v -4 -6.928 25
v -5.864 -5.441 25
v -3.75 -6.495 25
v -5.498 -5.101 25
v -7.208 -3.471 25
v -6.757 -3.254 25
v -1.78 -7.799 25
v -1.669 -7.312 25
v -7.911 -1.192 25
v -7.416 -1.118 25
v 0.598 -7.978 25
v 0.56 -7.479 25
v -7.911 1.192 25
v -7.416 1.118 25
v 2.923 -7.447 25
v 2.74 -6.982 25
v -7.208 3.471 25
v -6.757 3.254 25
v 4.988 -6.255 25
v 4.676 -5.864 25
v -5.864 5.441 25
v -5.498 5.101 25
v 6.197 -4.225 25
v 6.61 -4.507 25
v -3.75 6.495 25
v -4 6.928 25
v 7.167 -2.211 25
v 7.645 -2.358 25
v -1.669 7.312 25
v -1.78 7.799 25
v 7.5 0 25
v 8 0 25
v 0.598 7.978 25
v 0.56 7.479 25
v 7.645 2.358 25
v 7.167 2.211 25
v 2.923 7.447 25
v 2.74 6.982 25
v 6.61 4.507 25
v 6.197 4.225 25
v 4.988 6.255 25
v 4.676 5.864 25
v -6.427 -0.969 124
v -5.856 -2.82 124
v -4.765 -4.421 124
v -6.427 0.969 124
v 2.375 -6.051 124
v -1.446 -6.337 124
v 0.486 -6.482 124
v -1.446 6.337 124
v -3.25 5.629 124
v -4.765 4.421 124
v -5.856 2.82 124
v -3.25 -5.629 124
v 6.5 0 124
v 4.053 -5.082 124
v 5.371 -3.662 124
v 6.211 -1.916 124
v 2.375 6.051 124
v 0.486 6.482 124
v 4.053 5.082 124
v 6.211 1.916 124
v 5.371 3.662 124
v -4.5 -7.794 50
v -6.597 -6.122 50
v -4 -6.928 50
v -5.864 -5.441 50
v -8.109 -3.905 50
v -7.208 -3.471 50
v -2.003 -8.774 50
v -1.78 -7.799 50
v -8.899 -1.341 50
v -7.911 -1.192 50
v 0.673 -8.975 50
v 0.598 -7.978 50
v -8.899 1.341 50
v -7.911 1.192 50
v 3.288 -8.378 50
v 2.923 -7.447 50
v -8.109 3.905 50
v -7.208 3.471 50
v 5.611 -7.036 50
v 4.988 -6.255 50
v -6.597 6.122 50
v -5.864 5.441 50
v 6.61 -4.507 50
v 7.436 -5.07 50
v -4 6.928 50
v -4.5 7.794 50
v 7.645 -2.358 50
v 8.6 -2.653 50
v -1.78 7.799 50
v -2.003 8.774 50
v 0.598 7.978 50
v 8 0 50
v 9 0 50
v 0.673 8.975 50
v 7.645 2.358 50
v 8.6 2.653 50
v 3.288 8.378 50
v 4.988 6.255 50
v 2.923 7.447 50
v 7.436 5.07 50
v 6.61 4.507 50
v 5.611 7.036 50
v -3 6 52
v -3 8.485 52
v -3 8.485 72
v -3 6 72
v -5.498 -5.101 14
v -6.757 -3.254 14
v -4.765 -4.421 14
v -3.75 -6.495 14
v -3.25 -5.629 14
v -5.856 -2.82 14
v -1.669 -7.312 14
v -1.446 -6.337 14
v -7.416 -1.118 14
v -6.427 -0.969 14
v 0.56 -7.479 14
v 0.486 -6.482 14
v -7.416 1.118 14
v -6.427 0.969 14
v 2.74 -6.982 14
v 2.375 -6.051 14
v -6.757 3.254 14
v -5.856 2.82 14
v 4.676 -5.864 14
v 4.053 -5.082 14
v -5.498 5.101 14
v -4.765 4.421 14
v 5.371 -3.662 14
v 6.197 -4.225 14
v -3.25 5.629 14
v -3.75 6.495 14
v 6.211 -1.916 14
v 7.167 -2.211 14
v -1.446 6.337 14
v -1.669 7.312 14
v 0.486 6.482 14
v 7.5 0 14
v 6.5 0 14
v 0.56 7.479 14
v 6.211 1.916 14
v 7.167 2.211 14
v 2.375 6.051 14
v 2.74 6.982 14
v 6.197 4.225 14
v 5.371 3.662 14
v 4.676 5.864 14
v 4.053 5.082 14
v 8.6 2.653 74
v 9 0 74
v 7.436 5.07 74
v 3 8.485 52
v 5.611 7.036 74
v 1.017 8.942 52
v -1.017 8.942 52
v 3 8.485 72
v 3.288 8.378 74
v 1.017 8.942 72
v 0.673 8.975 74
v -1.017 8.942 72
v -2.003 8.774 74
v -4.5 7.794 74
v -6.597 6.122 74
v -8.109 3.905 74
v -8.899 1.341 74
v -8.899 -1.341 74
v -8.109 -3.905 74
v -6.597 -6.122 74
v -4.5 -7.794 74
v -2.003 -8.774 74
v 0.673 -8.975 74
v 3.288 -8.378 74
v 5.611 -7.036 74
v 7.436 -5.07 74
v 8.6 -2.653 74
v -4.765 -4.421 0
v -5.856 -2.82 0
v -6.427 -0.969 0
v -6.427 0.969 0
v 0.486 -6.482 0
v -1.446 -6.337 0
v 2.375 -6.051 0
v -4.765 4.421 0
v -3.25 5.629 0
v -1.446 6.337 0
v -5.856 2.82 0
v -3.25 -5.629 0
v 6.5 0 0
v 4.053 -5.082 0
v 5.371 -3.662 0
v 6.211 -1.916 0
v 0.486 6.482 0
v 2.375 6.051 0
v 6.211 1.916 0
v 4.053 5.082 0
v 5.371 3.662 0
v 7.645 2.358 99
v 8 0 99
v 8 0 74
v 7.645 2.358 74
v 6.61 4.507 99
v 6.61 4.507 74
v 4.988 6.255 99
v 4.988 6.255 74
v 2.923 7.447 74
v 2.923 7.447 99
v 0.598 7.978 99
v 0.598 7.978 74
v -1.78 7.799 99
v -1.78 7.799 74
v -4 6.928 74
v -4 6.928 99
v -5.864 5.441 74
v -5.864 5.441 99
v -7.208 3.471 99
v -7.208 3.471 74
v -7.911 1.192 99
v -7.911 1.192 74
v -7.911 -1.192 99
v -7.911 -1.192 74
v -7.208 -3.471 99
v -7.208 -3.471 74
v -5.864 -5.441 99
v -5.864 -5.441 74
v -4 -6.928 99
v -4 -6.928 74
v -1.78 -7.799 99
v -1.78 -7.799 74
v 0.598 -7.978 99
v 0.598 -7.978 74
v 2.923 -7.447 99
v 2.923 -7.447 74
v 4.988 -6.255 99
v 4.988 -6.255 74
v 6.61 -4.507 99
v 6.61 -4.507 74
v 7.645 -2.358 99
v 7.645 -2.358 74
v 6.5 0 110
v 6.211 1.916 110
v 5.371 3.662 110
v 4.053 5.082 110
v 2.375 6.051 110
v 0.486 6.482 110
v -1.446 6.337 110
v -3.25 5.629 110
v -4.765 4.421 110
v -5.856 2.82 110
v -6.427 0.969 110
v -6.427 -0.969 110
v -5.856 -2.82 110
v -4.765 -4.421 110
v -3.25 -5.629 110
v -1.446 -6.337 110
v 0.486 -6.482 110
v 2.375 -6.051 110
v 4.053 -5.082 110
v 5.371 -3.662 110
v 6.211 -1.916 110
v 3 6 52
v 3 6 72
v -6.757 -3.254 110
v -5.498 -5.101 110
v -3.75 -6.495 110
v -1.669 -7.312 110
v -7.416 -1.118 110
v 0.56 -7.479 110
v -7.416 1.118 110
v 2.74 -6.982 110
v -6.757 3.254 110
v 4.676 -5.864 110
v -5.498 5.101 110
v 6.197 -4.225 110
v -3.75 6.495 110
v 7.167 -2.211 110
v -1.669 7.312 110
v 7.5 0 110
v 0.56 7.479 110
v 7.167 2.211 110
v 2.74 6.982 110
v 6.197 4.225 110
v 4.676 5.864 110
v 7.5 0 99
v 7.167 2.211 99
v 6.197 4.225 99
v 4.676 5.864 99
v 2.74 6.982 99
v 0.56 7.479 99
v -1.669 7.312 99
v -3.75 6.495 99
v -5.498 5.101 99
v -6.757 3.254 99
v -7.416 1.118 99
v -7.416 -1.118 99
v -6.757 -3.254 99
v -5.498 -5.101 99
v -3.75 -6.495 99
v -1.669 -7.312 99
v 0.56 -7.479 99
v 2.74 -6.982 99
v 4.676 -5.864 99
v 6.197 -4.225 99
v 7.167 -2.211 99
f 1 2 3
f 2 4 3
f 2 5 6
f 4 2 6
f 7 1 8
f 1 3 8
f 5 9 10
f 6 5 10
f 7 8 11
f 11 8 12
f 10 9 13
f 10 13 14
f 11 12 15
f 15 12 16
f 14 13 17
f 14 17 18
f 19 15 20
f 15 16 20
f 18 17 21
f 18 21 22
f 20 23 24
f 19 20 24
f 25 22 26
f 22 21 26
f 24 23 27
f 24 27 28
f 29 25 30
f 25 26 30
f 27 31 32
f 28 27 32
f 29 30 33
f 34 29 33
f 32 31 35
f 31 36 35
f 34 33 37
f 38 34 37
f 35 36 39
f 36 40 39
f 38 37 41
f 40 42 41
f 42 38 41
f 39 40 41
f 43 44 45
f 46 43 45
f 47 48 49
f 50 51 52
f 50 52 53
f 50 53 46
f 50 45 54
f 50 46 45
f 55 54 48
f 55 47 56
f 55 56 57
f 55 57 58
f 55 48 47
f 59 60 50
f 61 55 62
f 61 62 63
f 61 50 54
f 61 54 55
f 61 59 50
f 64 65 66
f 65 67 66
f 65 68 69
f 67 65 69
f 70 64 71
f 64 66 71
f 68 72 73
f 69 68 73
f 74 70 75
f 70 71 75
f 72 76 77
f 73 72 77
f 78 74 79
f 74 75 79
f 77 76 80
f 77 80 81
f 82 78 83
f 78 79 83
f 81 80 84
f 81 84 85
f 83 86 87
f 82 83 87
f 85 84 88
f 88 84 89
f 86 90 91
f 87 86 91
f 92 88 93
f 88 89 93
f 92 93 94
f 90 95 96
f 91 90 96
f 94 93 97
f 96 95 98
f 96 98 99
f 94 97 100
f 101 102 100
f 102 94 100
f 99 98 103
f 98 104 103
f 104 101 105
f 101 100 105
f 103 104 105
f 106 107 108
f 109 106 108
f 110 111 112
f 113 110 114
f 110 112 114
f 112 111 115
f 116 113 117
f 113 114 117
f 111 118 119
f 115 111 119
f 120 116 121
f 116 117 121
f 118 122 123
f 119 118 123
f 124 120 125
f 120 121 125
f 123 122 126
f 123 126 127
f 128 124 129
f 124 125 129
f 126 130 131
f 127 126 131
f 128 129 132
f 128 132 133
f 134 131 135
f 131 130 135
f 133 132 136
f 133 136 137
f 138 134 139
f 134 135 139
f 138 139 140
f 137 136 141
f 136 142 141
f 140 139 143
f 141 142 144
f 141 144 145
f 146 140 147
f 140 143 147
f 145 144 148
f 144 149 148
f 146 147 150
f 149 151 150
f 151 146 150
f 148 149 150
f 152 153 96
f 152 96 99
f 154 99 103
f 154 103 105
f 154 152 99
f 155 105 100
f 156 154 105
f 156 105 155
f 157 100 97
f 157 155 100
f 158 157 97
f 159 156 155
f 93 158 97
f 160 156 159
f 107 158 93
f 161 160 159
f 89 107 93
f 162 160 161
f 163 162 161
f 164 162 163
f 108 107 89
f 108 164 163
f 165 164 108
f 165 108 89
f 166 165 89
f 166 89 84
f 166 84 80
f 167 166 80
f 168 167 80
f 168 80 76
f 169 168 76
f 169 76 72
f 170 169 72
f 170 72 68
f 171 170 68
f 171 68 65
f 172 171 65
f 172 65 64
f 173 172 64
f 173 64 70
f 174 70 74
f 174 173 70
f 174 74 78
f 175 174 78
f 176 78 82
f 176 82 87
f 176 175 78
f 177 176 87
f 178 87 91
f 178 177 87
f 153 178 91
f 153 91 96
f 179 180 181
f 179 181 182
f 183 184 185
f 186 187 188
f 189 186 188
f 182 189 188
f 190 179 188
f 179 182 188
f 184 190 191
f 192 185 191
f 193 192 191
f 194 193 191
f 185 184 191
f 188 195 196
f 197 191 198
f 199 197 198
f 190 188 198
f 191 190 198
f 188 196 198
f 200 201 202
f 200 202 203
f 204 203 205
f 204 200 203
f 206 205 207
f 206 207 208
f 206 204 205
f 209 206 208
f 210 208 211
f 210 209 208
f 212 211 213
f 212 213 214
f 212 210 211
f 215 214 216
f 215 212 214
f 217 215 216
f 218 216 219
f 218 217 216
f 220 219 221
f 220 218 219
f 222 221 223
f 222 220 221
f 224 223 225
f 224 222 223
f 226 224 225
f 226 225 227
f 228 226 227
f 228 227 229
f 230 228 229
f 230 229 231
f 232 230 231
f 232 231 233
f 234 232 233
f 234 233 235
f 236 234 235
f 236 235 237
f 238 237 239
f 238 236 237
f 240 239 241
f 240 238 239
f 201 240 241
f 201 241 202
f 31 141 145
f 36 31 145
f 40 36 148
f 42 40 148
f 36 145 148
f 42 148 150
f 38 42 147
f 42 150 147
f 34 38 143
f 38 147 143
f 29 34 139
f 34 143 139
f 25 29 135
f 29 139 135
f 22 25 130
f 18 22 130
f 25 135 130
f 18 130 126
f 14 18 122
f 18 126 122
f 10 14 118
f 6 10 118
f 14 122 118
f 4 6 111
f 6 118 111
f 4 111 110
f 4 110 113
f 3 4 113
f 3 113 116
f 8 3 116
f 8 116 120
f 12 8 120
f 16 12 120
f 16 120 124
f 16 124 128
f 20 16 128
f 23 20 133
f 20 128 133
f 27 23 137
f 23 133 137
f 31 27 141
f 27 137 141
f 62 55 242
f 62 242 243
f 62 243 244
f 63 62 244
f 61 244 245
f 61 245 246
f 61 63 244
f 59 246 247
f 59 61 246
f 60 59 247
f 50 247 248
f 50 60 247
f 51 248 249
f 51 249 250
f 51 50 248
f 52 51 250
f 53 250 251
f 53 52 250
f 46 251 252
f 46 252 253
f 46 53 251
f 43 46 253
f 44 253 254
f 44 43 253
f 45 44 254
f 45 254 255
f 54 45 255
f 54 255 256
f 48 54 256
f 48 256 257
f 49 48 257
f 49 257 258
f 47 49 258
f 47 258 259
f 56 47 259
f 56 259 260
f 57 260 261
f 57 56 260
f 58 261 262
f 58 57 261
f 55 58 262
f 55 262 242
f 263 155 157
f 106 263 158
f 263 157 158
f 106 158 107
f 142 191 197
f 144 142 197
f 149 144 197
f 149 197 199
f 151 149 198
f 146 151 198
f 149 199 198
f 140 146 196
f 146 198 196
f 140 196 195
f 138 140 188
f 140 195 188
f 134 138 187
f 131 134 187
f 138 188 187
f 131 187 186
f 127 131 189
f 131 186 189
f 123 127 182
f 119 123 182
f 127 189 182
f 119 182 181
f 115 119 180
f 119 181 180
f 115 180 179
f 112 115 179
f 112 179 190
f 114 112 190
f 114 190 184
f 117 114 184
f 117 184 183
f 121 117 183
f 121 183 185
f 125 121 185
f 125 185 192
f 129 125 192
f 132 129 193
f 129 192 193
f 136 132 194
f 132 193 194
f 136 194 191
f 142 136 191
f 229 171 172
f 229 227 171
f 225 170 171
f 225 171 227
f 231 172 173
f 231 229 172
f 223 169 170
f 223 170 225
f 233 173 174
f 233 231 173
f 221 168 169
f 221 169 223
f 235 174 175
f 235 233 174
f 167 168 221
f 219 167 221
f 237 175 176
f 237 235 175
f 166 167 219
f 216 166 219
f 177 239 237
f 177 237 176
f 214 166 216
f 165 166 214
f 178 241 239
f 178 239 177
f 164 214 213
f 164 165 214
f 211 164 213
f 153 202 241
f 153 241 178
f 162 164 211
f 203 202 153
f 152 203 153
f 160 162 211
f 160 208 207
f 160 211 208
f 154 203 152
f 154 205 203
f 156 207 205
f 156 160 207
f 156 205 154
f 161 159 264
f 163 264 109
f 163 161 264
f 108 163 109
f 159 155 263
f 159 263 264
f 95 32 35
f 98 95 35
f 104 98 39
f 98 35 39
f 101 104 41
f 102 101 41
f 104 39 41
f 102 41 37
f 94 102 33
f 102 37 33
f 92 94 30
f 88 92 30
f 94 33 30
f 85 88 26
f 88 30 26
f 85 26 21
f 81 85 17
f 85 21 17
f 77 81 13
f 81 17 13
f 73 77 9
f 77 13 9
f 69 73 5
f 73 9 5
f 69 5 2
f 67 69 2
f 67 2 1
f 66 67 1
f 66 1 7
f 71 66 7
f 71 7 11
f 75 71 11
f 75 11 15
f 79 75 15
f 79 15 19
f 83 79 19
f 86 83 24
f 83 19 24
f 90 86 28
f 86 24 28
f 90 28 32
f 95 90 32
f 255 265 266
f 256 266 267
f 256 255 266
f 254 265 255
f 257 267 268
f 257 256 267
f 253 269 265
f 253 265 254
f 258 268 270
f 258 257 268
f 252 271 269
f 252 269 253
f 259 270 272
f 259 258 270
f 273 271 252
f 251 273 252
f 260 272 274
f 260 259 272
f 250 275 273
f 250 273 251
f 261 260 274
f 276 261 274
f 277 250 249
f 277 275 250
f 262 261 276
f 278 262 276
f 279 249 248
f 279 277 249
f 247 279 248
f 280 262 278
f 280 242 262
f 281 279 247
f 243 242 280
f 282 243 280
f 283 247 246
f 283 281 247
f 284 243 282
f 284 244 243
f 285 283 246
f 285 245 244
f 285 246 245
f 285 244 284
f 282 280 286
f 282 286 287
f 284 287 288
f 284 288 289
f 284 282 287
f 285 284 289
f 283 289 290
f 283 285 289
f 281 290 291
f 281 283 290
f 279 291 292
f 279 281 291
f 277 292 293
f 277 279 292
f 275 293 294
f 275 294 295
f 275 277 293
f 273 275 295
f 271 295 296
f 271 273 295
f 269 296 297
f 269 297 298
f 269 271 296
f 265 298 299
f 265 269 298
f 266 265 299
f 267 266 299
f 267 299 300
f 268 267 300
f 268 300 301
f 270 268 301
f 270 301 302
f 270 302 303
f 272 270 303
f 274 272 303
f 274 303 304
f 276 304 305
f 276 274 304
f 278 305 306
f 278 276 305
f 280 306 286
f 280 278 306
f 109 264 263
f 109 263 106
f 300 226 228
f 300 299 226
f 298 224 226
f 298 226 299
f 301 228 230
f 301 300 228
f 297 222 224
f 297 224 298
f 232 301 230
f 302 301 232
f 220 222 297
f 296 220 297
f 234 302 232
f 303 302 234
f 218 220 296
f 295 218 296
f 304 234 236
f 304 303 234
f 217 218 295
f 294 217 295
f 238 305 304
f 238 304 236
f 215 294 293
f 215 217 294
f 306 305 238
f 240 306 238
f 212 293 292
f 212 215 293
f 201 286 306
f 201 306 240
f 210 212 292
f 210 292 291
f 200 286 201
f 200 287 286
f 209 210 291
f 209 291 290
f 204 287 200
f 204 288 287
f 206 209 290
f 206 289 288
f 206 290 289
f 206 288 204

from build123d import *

# Parameters (mm, degrees)
SKETCH1_R           = 6.5
BOSS_EXTRUDE1_DEPTH = 14
SKETCH2_R           = 7.5
BOSS_EXTRUDE2_DEPTH = 11
SKETCH3_R           = 8
BOSS_EXTRUDE3_DEPTH = 25
SKETCH4_R           = 9
BOSS_EXTRUDE4_DEPTH = 12
SKETCH5_W           = 6
SKETCH5_H           = 20
CUT_EXTRUDE2_DEPTH  = 3


with BuildPart() as part:
    # Sketch1 → Boss-Extrude1 (new body)
    with BuildSketch(Plane(origin=(0, 0, 0), x_dir=(0, 1, 0), z_dir=(0, 0, 1))):
        with Locations(Location((0, 0, 0), (0, 0, 270))):
            Circle(SKETCH1_R)
    extrude(amount=BOSS_EXTRUDE1_DEPTH)

    # Sketch2 → Boss-Extrude2 (add)
    with BuildSketch(Plane.XY.offset(14)):
        Circle(SKETCH2_R)
    extrude(amount=BOSS_EXTRUDE2_DEPTH)

    # Sketch3 → Boss-Extrude3 (add)
    with BuildSketch(Plane.XY.offset(25)):
        Circle(SKETCH3_R)
    extrude(amount=BOSS_EXTRUDE3_DEPTH)

    # Sketch4 → Boss-Extrude4 (add)
    with BuildSketch(Plane.XY.offset(50)):
        Circle(SKETCH4_R)
    extrude(amount=BOSS_EXTRUDE4_DEPTH)

    # Mirror1: part across plane


with BuildPart() as part_1:
    add(part.part)
    add(part.part.mirror(Plane.XY.offset(62)))

    # Sketch5 → Cut-Extrude2 (cut)
    with BuildSketch(Plane(origin=(0, 9, 0), x_dir=(-1, 0, 0), z_dir=(0, 1, 0))):
        with Locations((0, 62)):
            Rectangle(SKETCH5_W, SKETCH5_H)
    extrude(amount=-CUT_EXTRUDE2_DEPTH, mode=Mode.SUBTRACT)


solid = part_1.part
